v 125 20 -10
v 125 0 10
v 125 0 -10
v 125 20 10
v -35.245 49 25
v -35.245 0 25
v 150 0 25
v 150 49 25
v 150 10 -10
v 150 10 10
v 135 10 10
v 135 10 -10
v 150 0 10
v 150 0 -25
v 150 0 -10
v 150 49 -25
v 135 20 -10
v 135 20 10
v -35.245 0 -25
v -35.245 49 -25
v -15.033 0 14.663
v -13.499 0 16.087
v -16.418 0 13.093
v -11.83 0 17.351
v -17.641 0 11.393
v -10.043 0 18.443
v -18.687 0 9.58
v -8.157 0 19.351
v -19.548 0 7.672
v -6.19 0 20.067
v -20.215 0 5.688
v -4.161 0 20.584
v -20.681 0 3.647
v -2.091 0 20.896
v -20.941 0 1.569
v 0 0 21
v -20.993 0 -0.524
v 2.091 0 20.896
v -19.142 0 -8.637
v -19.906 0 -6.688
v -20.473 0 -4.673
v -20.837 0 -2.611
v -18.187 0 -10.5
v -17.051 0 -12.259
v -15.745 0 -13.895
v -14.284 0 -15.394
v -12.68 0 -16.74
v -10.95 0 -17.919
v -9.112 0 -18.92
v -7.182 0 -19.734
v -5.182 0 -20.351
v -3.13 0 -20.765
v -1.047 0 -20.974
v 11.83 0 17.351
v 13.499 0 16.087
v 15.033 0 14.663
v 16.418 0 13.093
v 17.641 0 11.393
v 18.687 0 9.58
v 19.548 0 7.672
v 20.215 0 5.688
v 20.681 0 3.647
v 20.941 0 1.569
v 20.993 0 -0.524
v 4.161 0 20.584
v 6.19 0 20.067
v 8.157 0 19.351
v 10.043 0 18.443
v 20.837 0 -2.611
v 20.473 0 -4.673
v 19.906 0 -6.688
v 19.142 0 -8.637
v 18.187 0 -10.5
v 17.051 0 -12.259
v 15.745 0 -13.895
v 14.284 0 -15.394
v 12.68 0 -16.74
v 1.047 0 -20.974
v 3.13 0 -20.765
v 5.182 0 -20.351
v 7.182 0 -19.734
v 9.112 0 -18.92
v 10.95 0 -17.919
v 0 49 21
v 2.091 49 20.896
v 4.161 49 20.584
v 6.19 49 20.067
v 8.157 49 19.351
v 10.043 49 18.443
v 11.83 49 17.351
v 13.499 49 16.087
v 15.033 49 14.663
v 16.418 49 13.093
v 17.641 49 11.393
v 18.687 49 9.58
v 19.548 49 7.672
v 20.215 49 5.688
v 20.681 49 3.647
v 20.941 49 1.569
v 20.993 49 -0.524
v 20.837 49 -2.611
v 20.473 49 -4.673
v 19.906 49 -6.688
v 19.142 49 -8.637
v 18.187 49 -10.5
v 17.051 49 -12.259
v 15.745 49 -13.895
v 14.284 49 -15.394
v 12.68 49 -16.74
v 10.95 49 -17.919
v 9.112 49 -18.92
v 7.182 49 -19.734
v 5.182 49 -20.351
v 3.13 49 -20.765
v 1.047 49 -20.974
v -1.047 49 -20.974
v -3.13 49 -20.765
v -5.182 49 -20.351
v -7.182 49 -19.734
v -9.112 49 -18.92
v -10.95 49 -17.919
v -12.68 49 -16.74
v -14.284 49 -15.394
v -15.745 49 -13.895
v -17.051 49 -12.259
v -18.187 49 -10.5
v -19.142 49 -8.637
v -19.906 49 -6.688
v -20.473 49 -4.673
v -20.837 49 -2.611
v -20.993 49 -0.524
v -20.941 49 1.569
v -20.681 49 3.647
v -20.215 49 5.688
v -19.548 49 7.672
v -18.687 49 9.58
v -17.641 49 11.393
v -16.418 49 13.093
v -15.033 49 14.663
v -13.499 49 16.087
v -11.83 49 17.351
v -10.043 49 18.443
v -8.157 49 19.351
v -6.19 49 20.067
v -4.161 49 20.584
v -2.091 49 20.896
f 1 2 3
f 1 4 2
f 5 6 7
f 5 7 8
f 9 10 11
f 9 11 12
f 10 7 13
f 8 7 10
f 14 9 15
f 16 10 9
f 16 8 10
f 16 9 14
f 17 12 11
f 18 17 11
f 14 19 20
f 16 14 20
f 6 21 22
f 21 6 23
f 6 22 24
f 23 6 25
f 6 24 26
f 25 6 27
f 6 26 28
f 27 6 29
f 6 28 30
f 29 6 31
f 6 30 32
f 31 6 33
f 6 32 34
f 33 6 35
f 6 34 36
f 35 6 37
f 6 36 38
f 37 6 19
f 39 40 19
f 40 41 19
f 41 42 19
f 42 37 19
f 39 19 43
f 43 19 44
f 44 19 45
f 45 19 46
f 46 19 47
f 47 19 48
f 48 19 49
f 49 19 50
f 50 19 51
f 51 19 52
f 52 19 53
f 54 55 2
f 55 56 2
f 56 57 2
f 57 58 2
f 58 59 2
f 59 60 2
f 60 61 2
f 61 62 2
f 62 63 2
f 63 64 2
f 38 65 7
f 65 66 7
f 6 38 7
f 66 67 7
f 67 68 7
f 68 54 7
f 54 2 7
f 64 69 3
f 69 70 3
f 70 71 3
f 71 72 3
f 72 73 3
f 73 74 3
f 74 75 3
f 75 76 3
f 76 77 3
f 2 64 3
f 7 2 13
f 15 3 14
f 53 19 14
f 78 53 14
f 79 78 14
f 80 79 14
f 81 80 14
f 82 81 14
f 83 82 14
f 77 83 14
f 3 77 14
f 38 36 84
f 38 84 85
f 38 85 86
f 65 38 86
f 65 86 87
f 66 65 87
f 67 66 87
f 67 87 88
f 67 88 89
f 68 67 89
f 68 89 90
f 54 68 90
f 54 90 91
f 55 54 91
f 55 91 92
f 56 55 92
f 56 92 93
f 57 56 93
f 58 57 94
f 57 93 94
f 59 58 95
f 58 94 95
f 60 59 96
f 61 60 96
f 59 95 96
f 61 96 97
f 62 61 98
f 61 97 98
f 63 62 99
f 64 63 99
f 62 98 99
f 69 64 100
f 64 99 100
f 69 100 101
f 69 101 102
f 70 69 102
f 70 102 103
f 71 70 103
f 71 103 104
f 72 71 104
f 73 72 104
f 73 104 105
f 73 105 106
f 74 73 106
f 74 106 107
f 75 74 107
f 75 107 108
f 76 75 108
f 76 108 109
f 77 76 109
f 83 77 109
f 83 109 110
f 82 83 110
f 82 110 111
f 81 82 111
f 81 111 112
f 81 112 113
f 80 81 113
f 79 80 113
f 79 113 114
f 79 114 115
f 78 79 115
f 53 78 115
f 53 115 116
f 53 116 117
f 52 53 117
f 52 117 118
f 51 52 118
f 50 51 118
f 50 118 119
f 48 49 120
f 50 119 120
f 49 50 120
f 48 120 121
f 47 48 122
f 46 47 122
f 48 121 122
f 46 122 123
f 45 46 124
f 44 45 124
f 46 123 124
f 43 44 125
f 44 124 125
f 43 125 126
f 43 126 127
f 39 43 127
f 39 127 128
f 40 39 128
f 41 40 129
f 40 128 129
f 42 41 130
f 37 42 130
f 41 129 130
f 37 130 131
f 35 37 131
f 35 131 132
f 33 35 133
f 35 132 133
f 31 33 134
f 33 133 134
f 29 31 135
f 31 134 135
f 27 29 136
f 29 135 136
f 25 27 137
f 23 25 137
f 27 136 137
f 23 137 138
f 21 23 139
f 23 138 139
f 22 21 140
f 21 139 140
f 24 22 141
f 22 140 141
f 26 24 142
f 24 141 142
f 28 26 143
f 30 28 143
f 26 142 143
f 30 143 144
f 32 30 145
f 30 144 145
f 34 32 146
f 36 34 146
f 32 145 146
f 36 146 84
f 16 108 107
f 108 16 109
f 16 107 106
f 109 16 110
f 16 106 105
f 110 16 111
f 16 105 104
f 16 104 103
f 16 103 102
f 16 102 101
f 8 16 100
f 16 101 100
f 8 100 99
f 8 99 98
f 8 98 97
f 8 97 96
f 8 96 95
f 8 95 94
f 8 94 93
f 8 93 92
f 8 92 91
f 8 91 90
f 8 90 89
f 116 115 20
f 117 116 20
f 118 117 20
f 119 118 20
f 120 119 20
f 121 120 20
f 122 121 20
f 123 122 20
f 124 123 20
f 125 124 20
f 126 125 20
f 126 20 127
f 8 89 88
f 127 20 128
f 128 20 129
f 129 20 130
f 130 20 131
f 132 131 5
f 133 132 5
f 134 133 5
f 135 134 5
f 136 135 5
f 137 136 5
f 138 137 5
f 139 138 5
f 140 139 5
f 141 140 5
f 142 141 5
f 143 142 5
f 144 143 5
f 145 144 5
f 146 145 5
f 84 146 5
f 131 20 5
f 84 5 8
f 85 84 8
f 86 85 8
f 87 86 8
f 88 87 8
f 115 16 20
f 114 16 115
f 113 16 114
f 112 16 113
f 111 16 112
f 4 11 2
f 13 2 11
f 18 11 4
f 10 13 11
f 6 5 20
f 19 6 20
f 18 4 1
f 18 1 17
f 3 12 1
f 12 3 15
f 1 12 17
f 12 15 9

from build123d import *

# Parameters (mm, degrees)
SKETCH1_W           = 100
SKETCH1_H           = 100
BOSS_EXTRUDE1_DEPTH = 50
SKETCH2_R           = 21
CUT_EXTRUDE1_DEPTH  = 87.602540378
SKETCH3_W           = 70
SKETCH3_H           = 50
BOSS_EXTRUDE2_DEPTH = 100
SKETCH4_W           = 100
SKETCH4_H           = 1
CUT_EXTRUDE2_DEPTH  = 213.132034356
SKETCH6_W           = 20
SKETCH6_H           = 10
CUT_EXTRUDE3_DEPTH  = 25
SKETCH7_W           = 10
SKETCH7_H           = 20
CUT_EXTRUDE4_DEPTH  = 10
SKETCH8_W           = 15
SKETCH8_H           = 49
CUT_EXTRUDE5_DEPTH  = 123.069652248
SKETCH9_W           = 14.755371785
SKETCH9_H           = 70
CUT_EXTRUDE6_DEPTH  = 162.635392164
SKETCH10_W          = 10
SKETCH10_H          = 49
CUT_EXTRUDE7_DEPTH  = 195.785965312


with BuildPart() as part:
    # Sketch1 → Boss-Extrude1 (new body)
    with BuildSketch(Plane(origin=(0, 0, 0), x_dir=(1, 0, 0), z_dir=(0, 1, 0))):
        Rectangle(SKETCH1_W, SKETCH1_H)
    extrude(amount=BOSS_EXTRUDE1_DEPTH)

    # Sketch2 → Cut-Extrude1 (cut, through all)
    with BuildSketch(Plane(origin=(0, 50, 0), x_dir=(1, 0, 0), z_dir=(0, 1, 0))):
        with Locations(Location((0, 0, 0), (0, 0, 270))):
            Circle(SKETCH2_R)
    extrude(amount=-CUT_EXTRUDE1_DEPTH, mode=Mode.SUBTRACT)

    # Sketch3 → Boss-Extrude2 (add)
    with BuildSketch(Plane(origin=(50, 0, 0), x_dir=(0, 0, -1), z_dir=(1, 0, 0))):
        with Locations((0, 25)):
            Rectangle(SKETCH3_W, SKETCH3_H)
    extrude(amount=BOSS_EXTRUDE2_DEPTH)

    # Sketch4 → Cut-Extrude2 (cut, through all)
    with BuildSketch(Plane.ZY.offset(50)):
        with Locations((0, 49.5)):
            Rectangle(SKETCH4_W, SKETCH4_H)
    extrude(amount=-CUT_EXTRUDE2_DEPTH, mode=Mode.SUBTRACT)

    # Sketch6 → Cut-Extrude3 (cut)
    with BuildSketch(Plane(origin=(150, 0, 0), x_dir=(0, 0, -1), z_dir=(1, 0, 0))):
        with Locations((0, 5)):
            Rectangle(SKETCH6_W, SKETCH6_H)
    extrude(amount=-CUT_EXTRUDE3_DEPTH, mode=Mode.SUBTRACT)

    # Sketch7 → Cut-Extrude4 (cut)
    with BuildSketch(Plane.XZ.offset(-10)):
        with Locations((130, 0)):
            Rectangle(SKETCH7_W, SKETCH7_H)
    extrude(amount=-CUT_EXTRUDE4_DEPTH, mode=Mode.SUBTRACT)

    # Sketch8 → Cut-Extrude5 (cut, through all)
    with BuildSketch(Plane(origin=(50, 0, 0), x_dir=(0, 0, -1), z_dir=(1, 0, 0))):
        with Locations((42.5, 24.5)):
            Rectangle(SKETCH8_W, SKETCH8_H)
        with Locations((-42.5, 24.5)):
            Rectangle(SKETCH8_W, SKETCH8_H)
    extrude(amount=-CUT_EXTRUDE5_DEPTH, mode=Mode.SUBTRACT)

    # Sketch9 → Cut-Extrude6 (cut, through all)
    with BuildSketch(Plane(origin=(0, 49, 0), x_dir=(1, 0, 0), z_dir=(0, 1, 0))):
        with Locations((-42.622314108, 0)):
            Rectangle(SKETCH9_W, SKETCH9_H)
    extrude(amount=-CUT_EXTRUDE6_DEPTH, mode=Mode.SUBTRACT)

    # Sketch10 → Cut-Extrude7 (cut, through all)
    with BuildSketch(Plane.ZY.offset(35.244628215)):
        with Locations((-30, 24.5)):
            Rectangle(SKETCH10_W, SKETCH10_H)
        with Locations((30, 24.5)):
            Rectangle(SKETCH10_W, SKETCH10_H)
    extrude(amount=-CUT_EXTRUDE7_DEPTH, mode=Mode.SUBTRACT)


solid = part.part
